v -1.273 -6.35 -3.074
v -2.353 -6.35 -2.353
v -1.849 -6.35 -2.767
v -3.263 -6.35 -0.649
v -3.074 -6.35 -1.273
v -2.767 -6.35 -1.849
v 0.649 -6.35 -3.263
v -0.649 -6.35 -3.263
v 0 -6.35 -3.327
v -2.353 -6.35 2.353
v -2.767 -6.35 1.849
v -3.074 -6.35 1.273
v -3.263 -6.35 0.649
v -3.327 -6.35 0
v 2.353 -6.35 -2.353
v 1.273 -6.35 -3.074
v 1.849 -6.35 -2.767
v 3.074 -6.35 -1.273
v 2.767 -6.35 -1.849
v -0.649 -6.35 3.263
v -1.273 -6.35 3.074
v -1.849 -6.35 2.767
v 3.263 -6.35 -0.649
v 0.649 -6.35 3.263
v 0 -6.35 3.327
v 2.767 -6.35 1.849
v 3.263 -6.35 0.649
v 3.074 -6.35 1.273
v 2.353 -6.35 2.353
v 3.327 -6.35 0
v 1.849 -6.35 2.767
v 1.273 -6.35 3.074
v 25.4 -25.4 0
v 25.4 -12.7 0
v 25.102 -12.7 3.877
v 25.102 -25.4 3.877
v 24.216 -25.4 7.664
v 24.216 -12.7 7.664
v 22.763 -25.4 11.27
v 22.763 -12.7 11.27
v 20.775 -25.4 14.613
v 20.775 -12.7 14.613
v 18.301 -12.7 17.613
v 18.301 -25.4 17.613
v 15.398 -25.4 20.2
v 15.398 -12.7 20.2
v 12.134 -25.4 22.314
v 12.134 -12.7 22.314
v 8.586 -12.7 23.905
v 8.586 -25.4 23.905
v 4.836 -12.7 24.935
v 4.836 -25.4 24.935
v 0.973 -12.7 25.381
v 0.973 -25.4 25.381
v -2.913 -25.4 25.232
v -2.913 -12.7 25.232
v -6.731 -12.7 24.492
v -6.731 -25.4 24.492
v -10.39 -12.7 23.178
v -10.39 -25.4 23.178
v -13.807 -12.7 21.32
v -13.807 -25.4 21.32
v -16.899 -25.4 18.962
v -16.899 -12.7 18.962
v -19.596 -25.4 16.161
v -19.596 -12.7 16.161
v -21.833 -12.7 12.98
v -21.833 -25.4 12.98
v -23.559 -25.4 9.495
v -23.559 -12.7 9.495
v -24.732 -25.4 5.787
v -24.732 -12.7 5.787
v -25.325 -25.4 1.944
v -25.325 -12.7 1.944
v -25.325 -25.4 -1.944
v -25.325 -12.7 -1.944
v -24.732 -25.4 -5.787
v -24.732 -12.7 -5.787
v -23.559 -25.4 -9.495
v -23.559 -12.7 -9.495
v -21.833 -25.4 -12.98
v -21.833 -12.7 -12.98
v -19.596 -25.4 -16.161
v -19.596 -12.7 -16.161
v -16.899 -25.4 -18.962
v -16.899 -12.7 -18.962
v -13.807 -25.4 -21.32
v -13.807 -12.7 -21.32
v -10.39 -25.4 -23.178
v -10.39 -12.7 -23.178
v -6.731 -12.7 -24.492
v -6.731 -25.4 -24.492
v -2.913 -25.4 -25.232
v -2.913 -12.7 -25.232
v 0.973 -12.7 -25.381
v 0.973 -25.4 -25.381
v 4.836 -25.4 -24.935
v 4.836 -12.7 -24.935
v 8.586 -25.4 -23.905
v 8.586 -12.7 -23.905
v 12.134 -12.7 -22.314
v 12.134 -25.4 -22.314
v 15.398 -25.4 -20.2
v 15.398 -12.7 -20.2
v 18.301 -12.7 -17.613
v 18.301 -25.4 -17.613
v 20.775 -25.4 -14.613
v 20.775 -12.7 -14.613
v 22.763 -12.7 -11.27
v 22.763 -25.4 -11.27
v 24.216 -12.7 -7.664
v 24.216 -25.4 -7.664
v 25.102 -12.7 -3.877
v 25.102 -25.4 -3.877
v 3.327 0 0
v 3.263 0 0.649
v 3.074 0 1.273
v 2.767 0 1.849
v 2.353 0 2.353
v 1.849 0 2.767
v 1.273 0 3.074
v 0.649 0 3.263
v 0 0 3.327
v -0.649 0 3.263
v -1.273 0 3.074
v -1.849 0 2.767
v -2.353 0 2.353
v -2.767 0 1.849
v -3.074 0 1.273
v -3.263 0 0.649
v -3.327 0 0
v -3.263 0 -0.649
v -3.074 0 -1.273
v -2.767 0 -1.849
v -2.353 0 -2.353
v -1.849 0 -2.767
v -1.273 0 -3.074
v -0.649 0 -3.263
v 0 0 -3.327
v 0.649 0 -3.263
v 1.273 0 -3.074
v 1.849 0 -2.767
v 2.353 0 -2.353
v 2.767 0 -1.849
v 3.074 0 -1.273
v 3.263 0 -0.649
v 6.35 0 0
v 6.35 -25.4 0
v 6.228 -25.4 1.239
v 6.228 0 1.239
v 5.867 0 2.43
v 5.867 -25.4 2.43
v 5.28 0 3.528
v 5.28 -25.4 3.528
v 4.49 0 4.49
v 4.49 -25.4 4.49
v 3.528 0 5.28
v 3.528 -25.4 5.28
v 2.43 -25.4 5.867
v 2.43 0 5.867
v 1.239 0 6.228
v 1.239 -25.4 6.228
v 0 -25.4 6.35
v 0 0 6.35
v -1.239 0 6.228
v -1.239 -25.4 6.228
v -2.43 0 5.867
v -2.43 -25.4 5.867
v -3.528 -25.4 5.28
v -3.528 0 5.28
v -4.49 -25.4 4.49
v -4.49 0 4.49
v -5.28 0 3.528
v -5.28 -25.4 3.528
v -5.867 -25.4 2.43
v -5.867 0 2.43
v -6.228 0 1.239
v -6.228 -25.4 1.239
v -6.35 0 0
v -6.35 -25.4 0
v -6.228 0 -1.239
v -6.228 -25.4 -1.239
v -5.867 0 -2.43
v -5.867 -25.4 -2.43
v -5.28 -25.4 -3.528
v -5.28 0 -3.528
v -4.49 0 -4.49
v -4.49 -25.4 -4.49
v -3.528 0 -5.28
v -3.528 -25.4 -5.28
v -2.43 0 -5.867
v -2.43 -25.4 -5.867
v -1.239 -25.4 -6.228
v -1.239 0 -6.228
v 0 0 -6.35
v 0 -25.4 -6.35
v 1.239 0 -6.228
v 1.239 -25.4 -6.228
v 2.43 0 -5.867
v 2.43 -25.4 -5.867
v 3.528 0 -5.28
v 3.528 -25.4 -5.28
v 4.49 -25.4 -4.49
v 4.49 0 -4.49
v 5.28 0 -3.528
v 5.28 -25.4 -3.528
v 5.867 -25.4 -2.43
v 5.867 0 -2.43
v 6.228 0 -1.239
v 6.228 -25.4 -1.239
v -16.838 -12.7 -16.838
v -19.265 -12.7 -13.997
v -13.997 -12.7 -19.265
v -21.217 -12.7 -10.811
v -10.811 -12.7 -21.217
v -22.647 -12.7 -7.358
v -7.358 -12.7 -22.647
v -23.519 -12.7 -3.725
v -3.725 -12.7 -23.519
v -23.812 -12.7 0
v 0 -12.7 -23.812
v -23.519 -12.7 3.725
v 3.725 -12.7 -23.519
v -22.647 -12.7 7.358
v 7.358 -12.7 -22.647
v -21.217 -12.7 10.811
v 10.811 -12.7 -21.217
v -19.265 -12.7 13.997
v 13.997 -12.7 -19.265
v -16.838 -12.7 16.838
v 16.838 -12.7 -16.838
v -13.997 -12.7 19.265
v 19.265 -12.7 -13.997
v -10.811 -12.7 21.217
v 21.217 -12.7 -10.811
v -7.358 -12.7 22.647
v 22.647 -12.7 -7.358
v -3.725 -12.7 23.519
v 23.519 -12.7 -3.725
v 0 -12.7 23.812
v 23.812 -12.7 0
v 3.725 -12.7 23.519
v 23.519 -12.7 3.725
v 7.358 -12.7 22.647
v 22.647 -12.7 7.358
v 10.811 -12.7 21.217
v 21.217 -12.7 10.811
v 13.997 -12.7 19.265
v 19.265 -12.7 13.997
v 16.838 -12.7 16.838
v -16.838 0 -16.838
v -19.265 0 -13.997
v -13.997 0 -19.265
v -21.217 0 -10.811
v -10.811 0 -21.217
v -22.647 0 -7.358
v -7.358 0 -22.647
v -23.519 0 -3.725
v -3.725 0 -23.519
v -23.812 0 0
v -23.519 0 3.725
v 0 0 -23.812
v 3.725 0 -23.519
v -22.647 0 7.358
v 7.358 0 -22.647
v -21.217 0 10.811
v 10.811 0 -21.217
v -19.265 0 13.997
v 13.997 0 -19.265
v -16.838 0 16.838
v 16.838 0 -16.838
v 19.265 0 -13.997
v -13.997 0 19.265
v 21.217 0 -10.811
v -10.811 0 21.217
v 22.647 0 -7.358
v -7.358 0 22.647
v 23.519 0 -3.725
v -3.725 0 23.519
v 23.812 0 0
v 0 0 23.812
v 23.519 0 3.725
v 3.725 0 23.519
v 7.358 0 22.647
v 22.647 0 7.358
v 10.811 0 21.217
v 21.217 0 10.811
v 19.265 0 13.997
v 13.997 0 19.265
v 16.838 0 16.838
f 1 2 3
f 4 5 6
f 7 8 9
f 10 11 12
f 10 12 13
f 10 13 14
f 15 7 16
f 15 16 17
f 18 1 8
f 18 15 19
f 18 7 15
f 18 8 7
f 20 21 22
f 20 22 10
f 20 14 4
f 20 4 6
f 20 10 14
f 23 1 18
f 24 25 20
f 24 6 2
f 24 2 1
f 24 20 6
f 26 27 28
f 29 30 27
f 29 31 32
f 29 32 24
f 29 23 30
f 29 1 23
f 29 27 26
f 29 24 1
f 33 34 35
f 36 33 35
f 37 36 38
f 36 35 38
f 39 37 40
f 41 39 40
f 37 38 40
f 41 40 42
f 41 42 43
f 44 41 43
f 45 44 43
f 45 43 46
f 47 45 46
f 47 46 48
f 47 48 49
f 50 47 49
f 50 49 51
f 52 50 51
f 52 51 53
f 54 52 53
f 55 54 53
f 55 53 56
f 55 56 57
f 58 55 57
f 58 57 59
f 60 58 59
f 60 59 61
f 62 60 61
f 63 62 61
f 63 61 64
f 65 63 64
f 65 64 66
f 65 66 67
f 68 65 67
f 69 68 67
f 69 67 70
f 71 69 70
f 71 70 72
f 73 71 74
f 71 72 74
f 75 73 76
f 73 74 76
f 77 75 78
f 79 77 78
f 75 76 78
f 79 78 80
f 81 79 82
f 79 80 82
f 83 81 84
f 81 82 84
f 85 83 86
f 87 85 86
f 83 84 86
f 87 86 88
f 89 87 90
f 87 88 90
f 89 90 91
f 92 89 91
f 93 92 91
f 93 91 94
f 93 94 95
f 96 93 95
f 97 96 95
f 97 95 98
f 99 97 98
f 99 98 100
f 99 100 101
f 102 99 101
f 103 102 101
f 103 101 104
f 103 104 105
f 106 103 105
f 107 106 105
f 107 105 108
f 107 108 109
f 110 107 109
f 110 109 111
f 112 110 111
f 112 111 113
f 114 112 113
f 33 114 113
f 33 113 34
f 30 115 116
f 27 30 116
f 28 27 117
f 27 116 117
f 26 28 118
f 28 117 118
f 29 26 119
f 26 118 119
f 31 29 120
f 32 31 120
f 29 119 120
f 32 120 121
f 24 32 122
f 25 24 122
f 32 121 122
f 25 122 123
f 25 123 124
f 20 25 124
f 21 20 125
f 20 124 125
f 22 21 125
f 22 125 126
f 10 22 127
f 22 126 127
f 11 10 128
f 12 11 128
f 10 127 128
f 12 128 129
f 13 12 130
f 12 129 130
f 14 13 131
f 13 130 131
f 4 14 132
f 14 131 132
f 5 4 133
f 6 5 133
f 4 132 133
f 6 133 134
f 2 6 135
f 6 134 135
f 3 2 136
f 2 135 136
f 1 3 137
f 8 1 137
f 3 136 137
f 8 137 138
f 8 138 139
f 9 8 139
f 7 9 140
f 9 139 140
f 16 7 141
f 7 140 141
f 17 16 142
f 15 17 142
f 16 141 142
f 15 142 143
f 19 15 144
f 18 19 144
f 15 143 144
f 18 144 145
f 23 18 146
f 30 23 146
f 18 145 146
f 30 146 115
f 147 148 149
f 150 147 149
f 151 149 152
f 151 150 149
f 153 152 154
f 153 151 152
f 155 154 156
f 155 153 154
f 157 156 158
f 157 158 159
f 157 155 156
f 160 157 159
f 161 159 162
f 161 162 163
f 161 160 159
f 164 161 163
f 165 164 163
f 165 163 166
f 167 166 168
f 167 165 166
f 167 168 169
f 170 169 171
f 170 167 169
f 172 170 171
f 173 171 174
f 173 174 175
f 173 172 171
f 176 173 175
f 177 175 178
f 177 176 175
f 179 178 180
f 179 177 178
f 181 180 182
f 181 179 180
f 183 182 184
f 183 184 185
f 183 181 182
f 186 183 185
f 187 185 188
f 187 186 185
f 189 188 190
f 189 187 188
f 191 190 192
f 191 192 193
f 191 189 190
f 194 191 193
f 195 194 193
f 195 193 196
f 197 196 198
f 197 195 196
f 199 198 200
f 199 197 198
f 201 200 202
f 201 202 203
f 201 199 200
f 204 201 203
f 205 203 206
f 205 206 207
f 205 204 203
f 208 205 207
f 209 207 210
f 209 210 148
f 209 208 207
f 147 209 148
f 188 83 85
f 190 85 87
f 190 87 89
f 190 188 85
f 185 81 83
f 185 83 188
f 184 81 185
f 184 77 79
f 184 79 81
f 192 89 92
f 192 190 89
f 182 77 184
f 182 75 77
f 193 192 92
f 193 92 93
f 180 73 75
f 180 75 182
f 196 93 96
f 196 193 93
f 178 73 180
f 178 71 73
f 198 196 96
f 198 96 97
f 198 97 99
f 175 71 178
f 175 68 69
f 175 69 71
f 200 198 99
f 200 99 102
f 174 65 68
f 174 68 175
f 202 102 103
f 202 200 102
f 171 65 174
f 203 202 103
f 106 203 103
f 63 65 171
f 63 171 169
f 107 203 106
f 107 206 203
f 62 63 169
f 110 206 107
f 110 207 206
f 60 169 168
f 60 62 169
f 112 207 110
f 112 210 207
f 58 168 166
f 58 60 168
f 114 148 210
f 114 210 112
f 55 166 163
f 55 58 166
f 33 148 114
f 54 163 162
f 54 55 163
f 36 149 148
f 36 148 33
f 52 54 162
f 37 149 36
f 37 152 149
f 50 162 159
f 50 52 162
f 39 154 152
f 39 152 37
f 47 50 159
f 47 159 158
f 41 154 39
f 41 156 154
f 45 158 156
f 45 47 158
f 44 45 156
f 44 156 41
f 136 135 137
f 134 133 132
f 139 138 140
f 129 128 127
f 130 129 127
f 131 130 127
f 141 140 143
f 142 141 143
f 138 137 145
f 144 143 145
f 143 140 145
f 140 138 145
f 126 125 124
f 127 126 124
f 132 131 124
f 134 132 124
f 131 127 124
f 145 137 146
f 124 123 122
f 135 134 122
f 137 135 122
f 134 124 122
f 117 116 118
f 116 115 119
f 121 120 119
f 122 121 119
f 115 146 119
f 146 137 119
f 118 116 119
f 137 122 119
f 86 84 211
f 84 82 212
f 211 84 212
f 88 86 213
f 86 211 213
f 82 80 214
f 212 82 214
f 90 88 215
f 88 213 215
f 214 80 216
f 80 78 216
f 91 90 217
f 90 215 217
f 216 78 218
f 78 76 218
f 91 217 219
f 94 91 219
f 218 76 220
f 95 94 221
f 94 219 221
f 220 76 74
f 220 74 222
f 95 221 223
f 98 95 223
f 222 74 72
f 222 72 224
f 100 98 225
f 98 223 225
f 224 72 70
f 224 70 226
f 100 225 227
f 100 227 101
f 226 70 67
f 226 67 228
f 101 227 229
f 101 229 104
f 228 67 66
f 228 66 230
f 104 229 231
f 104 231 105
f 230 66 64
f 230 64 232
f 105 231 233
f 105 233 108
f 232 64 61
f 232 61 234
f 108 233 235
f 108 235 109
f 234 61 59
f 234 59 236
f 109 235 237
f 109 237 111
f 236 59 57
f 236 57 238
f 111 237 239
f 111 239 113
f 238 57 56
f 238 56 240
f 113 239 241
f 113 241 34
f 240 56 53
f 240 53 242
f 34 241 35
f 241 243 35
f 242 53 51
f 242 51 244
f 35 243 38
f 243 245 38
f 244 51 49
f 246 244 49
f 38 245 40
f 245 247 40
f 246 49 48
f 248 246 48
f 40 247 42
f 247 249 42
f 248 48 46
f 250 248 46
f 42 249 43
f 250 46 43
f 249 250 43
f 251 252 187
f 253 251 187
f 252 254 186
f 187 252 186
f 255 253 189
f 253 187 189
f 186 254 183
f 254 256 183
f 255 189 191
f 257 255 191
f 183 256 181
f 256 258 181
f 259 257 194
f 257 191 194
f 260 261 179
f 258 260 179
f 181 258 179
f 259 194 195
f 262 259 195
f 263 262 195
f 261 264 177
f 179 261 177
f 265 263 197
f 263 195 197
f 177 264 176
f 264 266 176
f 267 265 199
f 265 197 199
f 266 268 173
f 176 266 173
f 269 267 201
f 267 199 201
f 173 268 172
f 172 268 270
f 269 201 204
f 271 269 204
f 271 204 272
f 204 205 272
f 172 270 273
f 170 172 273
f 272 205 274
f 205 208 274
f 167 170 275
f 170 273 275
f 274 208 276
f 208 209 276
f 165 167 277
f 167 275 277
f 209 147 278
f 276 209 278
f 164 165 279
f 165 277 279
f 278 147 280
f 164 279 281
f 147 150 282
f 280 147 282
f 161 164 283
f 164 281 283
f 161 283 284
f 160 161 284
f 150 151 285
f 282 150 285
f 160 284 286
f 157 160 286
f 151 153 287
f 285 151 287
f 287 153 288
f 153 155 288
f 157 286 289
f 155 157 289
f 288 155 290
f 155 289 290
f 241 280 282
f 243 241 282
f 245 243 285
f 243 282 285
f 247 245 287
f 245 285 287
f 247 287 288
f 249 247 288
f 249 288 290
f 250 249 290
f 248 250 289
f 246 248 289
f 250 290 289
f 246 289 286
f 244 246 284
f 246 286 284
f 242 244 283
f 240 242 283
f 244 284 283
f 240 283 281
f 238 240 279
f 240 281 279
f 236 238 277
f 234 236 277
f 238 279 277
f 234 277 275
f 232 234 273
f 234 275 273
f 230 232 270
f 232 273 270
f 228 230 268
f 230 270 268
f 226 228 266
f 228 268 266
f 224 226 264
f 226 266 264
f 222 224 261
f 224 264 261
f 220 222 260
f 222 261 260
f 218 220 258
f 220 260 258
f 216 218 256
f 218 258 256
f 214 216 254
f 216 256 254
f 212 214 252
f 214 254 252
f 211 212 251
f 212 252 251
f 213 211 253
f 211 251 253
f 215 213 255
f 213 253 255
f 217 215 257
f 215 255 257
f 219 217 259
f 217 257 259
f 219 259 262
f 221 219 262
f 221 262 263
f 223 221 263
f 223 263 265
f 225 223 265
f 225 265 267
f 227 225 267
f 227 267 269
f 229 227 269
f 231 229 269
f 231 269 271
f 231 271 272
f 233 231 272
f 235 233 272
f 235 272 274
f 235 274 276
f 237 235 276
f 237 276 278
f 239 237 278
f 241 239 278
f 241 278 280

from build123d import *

# Parameters (mm, degrees)
F0_R     = 25.4
F0_R_2   = 6.35
F1_DEPTH = 25.4
F2_R     = 3.3274
F3_DEPTH = 6.35
F4_R     = 25.4
F4_R_2   = 23.8125
F5_DEPTH = 12.7


with BuildPart() as f1:
    # F0 (on Front) → F1 (new body)
    with BuildSketch(Plane.XZ):
        Circle(F0_R)
        Circle(F0_R_2, mode=Mode.SUBTRACT)
    extrude(amount=F1_DEPTH)

    # F4 (on Front) → F5 (cut)
    with BuildSketch(Plane.XZ):
        Circle(F4_R)
        Circle(F4_R_2, mode=Mode.SUBTRACT)
    extrude(amount=F5_DEPTH, mode=Mode.SUBTRACT)


with BuildPart() as f3:
    # F2 (on Front) → F3 (new body)
    with BuildSketch(Plane.XZ):
        Circle(F2_R)
    extrude(amount=F3_DEPTH)


solid = Compound([f1.part, f3.part])
